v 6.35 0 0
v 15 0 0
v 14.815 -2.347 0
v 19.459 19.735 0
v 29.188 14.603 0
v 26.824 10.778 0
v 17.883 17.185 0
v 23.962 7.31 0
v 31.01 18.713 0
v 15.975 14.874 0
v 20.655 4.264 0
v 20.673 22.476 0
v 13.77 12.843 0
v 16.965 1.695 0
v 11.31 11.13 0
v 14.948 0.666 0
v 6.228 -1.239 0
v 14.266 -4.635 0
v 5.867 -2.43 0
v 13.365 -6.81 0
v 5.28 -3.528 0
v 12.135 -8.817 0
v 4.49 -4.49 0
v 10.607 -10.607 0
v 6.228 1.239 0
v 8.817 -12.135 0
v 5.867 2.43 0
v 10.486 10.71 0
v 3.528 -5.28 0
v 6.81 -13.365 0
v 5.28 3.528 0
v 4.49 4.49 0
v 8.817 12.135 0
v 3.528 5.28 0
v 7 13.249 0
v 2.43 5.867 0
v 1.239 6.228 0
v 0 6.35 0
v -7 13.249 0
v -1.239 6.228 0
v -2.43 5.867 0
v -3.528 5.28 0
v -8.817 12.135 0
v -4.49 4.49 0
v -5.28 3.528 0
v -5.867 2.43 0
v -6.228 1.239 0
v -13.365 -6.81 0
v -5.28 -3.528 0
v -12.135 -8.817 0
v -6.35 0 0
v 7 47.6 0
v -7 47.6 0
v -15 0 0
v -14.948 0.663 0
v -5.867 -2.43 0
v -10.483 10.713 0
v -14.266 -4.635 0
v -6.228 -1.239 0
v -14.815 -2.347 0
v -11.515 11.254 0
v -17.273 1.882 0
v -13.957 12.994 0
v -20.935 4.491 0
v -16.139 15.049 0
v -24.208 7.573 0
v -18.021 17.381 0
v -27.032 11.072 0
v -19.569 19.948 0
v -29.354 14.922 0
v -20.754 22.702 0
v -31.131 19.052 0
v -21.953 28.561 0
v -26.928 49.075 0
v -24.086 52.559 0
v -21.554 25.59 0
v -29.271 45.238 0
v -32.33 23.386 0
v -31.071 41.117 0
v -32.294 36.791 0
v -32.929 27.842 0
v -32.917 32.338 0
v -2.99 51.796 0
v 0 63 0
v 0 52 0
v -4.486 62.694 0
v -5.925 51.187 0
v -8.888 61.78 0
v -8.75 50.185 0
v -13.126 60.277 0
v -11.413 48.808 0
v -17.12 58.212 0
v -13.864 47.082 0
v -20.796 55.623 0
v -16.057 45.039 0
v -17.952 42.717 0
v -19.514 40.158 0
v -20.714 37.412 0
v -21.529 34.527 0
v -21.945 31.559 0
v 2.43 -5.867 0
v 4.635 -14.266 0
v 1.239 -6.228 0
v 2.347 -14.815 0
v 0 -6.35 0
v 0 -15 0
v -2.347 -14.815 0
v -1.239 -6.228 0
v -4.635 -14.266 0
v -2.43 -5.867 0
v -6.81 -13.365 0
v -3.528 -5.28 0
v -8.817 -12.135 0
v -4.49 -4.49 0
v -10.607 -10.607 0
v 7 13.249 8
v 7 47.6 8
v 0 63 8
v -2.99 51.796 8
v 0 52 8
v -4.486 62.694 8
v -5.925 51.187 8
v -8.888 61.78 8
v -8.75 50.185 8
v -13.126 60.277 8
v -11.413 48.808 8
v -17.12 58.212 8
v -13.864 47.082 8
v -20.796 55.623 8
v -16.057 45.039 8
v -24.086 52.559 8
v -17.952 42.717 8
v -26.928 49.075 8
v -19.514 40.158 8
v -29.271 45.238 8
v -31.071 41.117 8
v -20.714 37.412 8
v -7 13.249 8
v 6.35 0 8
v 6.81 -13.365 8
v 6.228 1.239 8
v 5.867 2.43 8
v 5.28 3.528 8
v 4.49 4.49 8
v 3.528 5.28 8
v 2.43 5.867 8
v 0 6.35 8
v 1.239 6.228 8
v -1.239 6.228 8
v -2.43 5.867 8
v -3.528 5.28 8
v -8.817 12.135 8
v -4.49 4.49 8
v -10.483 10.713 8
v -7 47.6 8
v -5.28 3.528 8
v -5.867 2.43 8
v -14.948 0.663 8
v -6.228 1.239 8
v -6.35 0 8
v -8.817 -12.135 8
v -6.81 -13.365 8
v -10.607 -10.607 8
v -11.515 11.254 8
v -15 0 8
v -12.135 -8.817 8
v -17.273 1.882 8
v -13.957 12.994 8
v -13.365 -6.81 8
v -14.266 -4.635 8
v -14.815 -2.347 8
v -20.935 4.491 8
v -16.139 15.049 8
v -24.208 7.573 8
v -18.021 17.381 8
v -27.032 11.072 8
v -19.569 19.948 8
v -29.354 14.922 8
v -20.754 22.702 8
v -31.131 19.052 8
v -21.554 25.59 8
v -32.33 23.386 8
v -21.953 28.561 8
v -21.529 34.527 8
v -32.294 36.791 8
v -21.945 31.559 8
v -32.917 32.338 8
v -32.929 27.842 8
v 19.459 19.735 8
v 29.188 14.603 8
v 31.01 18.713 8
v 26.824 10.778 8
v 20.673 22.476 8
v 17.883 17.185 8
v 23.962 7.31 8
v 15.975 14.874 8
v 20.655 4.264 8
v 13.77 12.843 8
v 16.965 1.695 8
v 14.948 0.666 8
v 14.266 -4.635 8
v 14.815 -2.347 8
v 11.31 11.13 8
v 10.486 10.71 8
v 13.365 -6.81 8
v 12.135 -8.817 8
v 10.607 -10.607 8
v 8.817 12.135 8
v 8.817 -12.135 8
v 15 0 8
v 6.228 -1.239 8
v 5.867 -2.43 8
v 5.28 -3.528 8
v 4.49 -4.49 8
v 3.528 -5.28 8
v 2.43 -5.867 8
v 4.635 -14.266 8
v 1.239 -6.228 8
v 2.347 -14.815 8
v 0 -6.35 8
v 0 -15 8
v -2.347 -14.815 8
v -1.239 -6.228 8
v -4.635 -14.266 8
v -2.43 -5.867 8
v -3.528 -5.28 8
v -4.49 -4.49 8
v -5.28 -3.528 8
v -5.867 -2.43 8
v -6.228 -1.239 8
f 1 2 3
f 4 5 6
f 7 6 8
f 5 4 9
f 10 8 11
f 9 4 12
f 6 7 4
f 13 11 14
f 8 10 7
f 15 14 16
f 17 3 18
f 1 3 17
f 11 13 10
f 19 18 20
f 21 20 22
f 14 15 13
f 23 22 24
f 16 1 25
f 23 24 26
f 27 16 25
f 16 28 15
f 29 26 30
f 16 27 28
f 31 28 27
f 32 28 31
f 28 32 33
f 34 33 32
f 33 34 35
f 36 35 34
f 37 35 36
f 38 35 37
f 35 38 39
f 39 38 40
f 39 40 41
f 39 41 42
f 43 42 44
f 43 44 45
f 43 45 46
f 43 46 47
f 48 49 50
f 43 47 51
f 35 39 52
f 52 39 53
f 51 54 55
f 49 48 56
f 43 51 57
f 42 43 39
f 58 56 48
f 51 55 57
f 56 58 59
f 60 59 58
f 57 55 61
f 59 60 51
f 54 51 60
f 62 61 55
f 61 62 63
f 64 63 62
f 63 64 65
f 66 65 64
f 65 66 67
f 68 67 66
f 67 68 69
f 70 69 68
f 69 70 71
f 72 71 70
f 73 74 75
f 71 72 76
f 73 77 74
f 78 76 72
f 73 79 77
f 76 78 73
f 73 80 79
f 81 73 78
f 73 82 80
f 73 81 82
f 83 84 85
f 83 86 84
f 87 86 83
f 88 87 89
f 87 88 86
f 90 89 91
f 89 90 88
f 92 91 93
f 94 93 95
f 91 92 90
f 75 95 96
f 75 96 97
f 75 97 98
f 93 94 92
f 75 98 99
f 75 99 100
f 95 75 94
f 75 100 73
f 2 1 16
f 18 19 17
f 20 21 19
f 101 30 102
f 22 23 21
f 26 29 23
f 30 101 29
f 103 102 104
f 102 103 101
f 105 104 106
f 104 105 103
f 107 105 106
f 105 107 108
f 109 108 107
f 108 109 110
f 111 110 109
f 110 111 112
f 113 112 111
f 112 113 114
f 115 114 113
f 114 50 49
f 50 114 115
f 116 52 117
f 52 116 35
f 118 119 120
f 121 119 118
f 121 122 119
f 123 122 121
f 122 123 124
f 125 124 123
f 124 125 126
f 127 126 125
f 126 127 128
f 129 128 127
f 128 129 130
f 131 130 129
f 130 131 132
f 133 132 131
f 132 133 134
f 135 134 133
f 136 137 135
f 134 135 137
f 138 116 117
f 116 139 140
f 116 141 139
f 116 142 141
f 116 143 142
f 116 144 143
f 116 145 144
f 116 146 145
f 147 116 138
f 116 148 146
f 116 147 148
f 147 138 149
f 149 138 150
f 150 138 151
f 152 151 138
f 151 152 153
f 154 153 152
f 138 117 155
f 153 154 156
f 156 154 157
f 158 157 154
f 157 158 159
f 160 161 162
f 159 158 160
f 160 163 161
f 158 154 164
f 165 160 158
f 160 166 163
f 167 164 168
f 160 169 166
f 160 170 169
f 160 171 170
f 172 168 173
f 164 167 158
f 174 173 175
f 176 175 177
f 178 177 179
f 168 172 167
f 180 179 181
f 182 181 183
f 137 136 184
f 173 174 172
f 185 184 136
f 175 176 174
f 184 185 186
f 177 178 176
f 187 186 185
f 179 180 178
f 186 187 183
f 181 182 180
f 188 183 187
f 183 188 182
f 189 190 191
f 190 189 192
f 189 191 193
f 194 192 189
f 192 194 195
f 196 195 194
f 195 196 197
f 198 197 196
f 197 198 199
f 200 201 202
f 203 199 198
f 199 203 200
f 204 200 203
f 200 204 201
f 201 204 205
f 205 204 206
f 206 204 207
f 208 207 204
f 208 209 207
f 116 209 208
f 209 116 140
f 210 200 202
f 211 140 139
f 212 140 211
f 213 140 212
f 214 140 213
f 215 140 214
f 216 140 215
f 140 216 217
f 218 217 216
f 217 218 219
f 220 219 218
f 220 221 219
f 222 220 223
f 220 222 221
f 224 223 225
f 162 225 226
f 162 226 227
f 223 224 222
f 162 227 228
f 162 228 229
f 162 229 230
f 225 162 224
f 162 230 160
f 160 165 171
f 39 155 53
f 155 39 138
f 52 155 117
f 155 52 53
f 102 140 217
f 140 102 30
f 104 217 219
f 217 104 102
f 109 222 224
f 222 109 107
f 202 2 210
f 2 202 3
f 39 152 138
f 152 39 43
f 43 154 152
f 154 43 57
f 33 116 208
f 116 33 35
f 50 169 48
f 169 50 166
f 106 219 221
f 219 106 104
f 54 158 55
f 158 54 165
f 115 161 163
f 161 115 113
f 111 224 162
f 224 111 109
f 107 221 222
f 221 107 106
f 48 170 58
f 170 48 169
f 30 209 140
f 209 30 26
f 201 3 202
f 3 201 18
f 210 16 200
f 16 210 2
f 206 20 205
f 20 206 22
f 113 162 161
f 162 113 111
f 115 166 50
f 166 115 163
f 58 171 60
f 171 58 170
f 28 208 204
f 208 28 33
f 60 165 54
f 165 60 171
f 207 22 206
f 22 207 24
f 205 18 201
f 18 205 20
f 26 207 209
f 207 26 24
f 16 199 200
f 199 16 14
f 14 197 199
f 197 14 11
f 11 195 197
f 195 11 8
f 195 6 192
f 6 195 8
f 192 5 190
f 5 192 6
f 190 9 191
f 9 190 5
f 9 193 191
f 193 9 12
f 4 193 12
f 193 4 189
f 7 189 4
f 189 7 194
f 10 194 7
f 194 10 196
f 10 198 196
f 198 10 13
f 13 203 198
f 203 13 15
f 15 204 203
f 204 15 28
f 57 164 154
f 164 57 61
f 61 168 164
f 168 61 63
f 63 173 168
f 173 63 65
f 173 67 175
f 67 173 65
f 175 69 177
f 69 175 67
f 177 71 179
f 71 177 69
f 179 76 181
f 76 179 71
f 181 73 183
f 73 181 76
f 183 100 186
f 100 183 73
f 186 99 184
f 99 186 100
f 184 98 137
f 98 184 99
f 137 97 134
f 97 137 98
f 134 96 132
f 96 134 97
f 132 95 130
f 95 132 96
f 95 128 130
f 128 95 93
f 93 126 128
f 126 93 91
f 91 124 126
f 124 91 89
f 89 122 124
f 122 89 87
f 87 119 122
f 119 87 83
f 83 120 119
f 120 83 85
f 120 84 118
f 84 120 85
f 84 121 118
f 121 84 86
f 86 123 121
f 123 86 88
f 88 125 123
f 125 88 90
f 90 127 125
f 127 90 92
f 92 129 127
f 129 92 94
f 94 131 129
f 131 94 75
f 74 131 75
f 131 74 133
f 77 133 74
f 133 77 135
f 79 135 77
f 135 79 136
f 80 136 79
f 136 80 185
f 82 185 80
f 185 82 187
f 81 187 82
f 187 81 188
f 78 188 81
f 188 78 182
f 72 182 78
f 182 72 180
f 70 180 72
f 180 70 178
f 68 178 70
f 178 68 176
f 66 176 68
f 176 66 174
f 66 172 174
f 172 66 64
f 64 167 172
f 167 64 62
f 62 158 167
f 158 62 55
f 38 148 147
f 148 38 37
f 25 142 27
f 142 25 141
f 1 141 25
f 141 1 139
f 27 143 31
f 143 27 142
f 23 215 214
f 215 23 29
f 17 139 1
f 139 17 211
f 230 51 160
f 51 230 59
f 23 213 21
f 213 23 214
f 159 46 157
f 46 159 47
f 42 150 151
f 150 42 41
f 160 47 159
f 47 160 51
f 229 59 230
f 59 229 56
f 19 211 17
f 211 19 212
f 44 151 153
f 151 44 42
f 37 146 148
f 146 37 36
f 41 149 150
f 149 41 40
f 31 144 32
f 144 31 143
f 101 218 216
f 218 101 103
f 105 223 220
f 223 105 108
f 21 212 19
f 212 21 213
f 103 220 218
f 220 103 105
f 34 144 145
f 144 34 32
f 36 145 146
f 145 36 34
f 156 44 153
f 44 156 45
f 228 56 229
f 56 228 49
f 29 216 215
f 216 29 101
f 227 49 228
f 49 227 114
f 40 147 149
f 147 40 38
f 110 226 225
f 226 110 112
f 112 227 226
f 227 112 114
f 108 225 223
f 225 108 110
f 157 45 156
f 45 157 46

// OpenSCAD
$fn = 32;

// ----------------------------------------------------------------------
// Hook: 60 mm shank into a 22 mm curl, 8 mm thick
// ----------------------------------------------------------------------

// --- parameters (mm) ---
shank_len = 60;           // shank length from the boss centre
shank_w = 14;             // shank width
boss_d = 30;              // boss diameter
bore_d = 12.7;            // boss bore
curl_in = 22;             // curl inner radius
curl_out = 33;            // curl outer radius
curl_sweep = 250;         // curl sweep angle
hook_t = 8;               // hook thickness

shank_profile = [[-7, 47.6], [7, 47.6], [7, 13], [-7, 13]];
boss_profile = [[15, 0], [14.815, 2.347], [14.266, 4.635], [13.365, 6.81], [12.135, 8.817], [10.607, 10.607], [8.817, 12.135], [6.81, 13.365], [4.635, 14.266], [2.347, 14.815], [0, 15], [-2.347, 14.815], [-4.635, 14.266], [-6.81, 13.365], [-8.817, 12.135], [-10.607, 10.607], [-12.135, 8.817], [-13.365, 6.81], [-14.266, 4.635], [-14.815, 2.347], [-15, 0], [-14.815, -2.347], [-14.266, -4.635], [-13.365, -6.81], [-12.135, -8.817], [-10.607, -10.607], [-8.817, -12.135], [-6.81, -13.365], [-4.635, -14.266], [-2.347, -14.815], [0, -15], [2.347, -14.815], [4.635, -14.266], [6.81, -13.365], [8.817, -12.135], [10.607, -10.607], [12.135, -8.817], [13.365, -6.81], [14.266, -4.635], [14.815, -2.347]];
curl_profile = [[0, 63], [-4.486, 62.694], [-8.888, 61.78], [-13.126, 60.277], [-17.12, 58.212], [-20.796, 55.623], [-24.086, 52.559], [-26.928, 49.075], [-29.271, 45.238], [-31.071, 41.117], [-32.294, 36.791], [-32.917, 32.338], [-32.929, 27.842], [-32.33, 23.386], [-31.131, 19.052], [-29.354, 14.922], [-27.032, 11.072], [-24.208, 7.573], [-20.935, 4.491], [-17.273, 1.882], [-13.291, -0.205], [-9.061, -1.732], [-4.664, -2.669], [-0.18, -3], [4.307, -2.718], [8.715, -1.828], [12.96, -0.348], [16.965, 1.695], [20.655, 4.264], [23.962, 7.31], [26.824, 10.778], [29.188, 14.603], [31.01, 18.713], [20.673, 22.476], [19.459, 19.735], [17.883, 17.185], [15.975, 14.874], [13.77, 12.843], [11.31, 11.13], [8.64, 9.768], [5.81, 8.781], [2.872, 8.188], [-0.12, 8], [-3.109, 8.221], [-6.041, 8.846], [-8.86, 9.863], [-11.515, 11.254], [-13.957, 12.994], [-16.139, 15.049], [-18.021, 17.381], [-19.569, 19.948], [-20.754, 22.702], [-21.554, 25.59], [-21.953, 28.561], [-21.945, 31.559], [-21.529, 34.527], [-20.714, 37.412], [-19.514, 40.158], [-17.952, 42.717], [-16.057, 45.039], [-13.864, 47.082], [-11.413, 48.808], [-8.75, 50.185], [-5.925, 51.187], [-2.99, 51.796], [0, 52]];

difference() {
  union() {
    /* three overlapping outlines: shank, boss and the smooth curl */
    linear_extrude(height = hook_t) polygon(shank_profile);
    linear_extrude(height = hook_t) polygon(boss_profile);
    linear_extrude(height = hook_t) polygon(curl_profile);
  }
  translate([0, 0, -2.5]) cylinder(h = hook_t + 5, d = bore_d);
}
